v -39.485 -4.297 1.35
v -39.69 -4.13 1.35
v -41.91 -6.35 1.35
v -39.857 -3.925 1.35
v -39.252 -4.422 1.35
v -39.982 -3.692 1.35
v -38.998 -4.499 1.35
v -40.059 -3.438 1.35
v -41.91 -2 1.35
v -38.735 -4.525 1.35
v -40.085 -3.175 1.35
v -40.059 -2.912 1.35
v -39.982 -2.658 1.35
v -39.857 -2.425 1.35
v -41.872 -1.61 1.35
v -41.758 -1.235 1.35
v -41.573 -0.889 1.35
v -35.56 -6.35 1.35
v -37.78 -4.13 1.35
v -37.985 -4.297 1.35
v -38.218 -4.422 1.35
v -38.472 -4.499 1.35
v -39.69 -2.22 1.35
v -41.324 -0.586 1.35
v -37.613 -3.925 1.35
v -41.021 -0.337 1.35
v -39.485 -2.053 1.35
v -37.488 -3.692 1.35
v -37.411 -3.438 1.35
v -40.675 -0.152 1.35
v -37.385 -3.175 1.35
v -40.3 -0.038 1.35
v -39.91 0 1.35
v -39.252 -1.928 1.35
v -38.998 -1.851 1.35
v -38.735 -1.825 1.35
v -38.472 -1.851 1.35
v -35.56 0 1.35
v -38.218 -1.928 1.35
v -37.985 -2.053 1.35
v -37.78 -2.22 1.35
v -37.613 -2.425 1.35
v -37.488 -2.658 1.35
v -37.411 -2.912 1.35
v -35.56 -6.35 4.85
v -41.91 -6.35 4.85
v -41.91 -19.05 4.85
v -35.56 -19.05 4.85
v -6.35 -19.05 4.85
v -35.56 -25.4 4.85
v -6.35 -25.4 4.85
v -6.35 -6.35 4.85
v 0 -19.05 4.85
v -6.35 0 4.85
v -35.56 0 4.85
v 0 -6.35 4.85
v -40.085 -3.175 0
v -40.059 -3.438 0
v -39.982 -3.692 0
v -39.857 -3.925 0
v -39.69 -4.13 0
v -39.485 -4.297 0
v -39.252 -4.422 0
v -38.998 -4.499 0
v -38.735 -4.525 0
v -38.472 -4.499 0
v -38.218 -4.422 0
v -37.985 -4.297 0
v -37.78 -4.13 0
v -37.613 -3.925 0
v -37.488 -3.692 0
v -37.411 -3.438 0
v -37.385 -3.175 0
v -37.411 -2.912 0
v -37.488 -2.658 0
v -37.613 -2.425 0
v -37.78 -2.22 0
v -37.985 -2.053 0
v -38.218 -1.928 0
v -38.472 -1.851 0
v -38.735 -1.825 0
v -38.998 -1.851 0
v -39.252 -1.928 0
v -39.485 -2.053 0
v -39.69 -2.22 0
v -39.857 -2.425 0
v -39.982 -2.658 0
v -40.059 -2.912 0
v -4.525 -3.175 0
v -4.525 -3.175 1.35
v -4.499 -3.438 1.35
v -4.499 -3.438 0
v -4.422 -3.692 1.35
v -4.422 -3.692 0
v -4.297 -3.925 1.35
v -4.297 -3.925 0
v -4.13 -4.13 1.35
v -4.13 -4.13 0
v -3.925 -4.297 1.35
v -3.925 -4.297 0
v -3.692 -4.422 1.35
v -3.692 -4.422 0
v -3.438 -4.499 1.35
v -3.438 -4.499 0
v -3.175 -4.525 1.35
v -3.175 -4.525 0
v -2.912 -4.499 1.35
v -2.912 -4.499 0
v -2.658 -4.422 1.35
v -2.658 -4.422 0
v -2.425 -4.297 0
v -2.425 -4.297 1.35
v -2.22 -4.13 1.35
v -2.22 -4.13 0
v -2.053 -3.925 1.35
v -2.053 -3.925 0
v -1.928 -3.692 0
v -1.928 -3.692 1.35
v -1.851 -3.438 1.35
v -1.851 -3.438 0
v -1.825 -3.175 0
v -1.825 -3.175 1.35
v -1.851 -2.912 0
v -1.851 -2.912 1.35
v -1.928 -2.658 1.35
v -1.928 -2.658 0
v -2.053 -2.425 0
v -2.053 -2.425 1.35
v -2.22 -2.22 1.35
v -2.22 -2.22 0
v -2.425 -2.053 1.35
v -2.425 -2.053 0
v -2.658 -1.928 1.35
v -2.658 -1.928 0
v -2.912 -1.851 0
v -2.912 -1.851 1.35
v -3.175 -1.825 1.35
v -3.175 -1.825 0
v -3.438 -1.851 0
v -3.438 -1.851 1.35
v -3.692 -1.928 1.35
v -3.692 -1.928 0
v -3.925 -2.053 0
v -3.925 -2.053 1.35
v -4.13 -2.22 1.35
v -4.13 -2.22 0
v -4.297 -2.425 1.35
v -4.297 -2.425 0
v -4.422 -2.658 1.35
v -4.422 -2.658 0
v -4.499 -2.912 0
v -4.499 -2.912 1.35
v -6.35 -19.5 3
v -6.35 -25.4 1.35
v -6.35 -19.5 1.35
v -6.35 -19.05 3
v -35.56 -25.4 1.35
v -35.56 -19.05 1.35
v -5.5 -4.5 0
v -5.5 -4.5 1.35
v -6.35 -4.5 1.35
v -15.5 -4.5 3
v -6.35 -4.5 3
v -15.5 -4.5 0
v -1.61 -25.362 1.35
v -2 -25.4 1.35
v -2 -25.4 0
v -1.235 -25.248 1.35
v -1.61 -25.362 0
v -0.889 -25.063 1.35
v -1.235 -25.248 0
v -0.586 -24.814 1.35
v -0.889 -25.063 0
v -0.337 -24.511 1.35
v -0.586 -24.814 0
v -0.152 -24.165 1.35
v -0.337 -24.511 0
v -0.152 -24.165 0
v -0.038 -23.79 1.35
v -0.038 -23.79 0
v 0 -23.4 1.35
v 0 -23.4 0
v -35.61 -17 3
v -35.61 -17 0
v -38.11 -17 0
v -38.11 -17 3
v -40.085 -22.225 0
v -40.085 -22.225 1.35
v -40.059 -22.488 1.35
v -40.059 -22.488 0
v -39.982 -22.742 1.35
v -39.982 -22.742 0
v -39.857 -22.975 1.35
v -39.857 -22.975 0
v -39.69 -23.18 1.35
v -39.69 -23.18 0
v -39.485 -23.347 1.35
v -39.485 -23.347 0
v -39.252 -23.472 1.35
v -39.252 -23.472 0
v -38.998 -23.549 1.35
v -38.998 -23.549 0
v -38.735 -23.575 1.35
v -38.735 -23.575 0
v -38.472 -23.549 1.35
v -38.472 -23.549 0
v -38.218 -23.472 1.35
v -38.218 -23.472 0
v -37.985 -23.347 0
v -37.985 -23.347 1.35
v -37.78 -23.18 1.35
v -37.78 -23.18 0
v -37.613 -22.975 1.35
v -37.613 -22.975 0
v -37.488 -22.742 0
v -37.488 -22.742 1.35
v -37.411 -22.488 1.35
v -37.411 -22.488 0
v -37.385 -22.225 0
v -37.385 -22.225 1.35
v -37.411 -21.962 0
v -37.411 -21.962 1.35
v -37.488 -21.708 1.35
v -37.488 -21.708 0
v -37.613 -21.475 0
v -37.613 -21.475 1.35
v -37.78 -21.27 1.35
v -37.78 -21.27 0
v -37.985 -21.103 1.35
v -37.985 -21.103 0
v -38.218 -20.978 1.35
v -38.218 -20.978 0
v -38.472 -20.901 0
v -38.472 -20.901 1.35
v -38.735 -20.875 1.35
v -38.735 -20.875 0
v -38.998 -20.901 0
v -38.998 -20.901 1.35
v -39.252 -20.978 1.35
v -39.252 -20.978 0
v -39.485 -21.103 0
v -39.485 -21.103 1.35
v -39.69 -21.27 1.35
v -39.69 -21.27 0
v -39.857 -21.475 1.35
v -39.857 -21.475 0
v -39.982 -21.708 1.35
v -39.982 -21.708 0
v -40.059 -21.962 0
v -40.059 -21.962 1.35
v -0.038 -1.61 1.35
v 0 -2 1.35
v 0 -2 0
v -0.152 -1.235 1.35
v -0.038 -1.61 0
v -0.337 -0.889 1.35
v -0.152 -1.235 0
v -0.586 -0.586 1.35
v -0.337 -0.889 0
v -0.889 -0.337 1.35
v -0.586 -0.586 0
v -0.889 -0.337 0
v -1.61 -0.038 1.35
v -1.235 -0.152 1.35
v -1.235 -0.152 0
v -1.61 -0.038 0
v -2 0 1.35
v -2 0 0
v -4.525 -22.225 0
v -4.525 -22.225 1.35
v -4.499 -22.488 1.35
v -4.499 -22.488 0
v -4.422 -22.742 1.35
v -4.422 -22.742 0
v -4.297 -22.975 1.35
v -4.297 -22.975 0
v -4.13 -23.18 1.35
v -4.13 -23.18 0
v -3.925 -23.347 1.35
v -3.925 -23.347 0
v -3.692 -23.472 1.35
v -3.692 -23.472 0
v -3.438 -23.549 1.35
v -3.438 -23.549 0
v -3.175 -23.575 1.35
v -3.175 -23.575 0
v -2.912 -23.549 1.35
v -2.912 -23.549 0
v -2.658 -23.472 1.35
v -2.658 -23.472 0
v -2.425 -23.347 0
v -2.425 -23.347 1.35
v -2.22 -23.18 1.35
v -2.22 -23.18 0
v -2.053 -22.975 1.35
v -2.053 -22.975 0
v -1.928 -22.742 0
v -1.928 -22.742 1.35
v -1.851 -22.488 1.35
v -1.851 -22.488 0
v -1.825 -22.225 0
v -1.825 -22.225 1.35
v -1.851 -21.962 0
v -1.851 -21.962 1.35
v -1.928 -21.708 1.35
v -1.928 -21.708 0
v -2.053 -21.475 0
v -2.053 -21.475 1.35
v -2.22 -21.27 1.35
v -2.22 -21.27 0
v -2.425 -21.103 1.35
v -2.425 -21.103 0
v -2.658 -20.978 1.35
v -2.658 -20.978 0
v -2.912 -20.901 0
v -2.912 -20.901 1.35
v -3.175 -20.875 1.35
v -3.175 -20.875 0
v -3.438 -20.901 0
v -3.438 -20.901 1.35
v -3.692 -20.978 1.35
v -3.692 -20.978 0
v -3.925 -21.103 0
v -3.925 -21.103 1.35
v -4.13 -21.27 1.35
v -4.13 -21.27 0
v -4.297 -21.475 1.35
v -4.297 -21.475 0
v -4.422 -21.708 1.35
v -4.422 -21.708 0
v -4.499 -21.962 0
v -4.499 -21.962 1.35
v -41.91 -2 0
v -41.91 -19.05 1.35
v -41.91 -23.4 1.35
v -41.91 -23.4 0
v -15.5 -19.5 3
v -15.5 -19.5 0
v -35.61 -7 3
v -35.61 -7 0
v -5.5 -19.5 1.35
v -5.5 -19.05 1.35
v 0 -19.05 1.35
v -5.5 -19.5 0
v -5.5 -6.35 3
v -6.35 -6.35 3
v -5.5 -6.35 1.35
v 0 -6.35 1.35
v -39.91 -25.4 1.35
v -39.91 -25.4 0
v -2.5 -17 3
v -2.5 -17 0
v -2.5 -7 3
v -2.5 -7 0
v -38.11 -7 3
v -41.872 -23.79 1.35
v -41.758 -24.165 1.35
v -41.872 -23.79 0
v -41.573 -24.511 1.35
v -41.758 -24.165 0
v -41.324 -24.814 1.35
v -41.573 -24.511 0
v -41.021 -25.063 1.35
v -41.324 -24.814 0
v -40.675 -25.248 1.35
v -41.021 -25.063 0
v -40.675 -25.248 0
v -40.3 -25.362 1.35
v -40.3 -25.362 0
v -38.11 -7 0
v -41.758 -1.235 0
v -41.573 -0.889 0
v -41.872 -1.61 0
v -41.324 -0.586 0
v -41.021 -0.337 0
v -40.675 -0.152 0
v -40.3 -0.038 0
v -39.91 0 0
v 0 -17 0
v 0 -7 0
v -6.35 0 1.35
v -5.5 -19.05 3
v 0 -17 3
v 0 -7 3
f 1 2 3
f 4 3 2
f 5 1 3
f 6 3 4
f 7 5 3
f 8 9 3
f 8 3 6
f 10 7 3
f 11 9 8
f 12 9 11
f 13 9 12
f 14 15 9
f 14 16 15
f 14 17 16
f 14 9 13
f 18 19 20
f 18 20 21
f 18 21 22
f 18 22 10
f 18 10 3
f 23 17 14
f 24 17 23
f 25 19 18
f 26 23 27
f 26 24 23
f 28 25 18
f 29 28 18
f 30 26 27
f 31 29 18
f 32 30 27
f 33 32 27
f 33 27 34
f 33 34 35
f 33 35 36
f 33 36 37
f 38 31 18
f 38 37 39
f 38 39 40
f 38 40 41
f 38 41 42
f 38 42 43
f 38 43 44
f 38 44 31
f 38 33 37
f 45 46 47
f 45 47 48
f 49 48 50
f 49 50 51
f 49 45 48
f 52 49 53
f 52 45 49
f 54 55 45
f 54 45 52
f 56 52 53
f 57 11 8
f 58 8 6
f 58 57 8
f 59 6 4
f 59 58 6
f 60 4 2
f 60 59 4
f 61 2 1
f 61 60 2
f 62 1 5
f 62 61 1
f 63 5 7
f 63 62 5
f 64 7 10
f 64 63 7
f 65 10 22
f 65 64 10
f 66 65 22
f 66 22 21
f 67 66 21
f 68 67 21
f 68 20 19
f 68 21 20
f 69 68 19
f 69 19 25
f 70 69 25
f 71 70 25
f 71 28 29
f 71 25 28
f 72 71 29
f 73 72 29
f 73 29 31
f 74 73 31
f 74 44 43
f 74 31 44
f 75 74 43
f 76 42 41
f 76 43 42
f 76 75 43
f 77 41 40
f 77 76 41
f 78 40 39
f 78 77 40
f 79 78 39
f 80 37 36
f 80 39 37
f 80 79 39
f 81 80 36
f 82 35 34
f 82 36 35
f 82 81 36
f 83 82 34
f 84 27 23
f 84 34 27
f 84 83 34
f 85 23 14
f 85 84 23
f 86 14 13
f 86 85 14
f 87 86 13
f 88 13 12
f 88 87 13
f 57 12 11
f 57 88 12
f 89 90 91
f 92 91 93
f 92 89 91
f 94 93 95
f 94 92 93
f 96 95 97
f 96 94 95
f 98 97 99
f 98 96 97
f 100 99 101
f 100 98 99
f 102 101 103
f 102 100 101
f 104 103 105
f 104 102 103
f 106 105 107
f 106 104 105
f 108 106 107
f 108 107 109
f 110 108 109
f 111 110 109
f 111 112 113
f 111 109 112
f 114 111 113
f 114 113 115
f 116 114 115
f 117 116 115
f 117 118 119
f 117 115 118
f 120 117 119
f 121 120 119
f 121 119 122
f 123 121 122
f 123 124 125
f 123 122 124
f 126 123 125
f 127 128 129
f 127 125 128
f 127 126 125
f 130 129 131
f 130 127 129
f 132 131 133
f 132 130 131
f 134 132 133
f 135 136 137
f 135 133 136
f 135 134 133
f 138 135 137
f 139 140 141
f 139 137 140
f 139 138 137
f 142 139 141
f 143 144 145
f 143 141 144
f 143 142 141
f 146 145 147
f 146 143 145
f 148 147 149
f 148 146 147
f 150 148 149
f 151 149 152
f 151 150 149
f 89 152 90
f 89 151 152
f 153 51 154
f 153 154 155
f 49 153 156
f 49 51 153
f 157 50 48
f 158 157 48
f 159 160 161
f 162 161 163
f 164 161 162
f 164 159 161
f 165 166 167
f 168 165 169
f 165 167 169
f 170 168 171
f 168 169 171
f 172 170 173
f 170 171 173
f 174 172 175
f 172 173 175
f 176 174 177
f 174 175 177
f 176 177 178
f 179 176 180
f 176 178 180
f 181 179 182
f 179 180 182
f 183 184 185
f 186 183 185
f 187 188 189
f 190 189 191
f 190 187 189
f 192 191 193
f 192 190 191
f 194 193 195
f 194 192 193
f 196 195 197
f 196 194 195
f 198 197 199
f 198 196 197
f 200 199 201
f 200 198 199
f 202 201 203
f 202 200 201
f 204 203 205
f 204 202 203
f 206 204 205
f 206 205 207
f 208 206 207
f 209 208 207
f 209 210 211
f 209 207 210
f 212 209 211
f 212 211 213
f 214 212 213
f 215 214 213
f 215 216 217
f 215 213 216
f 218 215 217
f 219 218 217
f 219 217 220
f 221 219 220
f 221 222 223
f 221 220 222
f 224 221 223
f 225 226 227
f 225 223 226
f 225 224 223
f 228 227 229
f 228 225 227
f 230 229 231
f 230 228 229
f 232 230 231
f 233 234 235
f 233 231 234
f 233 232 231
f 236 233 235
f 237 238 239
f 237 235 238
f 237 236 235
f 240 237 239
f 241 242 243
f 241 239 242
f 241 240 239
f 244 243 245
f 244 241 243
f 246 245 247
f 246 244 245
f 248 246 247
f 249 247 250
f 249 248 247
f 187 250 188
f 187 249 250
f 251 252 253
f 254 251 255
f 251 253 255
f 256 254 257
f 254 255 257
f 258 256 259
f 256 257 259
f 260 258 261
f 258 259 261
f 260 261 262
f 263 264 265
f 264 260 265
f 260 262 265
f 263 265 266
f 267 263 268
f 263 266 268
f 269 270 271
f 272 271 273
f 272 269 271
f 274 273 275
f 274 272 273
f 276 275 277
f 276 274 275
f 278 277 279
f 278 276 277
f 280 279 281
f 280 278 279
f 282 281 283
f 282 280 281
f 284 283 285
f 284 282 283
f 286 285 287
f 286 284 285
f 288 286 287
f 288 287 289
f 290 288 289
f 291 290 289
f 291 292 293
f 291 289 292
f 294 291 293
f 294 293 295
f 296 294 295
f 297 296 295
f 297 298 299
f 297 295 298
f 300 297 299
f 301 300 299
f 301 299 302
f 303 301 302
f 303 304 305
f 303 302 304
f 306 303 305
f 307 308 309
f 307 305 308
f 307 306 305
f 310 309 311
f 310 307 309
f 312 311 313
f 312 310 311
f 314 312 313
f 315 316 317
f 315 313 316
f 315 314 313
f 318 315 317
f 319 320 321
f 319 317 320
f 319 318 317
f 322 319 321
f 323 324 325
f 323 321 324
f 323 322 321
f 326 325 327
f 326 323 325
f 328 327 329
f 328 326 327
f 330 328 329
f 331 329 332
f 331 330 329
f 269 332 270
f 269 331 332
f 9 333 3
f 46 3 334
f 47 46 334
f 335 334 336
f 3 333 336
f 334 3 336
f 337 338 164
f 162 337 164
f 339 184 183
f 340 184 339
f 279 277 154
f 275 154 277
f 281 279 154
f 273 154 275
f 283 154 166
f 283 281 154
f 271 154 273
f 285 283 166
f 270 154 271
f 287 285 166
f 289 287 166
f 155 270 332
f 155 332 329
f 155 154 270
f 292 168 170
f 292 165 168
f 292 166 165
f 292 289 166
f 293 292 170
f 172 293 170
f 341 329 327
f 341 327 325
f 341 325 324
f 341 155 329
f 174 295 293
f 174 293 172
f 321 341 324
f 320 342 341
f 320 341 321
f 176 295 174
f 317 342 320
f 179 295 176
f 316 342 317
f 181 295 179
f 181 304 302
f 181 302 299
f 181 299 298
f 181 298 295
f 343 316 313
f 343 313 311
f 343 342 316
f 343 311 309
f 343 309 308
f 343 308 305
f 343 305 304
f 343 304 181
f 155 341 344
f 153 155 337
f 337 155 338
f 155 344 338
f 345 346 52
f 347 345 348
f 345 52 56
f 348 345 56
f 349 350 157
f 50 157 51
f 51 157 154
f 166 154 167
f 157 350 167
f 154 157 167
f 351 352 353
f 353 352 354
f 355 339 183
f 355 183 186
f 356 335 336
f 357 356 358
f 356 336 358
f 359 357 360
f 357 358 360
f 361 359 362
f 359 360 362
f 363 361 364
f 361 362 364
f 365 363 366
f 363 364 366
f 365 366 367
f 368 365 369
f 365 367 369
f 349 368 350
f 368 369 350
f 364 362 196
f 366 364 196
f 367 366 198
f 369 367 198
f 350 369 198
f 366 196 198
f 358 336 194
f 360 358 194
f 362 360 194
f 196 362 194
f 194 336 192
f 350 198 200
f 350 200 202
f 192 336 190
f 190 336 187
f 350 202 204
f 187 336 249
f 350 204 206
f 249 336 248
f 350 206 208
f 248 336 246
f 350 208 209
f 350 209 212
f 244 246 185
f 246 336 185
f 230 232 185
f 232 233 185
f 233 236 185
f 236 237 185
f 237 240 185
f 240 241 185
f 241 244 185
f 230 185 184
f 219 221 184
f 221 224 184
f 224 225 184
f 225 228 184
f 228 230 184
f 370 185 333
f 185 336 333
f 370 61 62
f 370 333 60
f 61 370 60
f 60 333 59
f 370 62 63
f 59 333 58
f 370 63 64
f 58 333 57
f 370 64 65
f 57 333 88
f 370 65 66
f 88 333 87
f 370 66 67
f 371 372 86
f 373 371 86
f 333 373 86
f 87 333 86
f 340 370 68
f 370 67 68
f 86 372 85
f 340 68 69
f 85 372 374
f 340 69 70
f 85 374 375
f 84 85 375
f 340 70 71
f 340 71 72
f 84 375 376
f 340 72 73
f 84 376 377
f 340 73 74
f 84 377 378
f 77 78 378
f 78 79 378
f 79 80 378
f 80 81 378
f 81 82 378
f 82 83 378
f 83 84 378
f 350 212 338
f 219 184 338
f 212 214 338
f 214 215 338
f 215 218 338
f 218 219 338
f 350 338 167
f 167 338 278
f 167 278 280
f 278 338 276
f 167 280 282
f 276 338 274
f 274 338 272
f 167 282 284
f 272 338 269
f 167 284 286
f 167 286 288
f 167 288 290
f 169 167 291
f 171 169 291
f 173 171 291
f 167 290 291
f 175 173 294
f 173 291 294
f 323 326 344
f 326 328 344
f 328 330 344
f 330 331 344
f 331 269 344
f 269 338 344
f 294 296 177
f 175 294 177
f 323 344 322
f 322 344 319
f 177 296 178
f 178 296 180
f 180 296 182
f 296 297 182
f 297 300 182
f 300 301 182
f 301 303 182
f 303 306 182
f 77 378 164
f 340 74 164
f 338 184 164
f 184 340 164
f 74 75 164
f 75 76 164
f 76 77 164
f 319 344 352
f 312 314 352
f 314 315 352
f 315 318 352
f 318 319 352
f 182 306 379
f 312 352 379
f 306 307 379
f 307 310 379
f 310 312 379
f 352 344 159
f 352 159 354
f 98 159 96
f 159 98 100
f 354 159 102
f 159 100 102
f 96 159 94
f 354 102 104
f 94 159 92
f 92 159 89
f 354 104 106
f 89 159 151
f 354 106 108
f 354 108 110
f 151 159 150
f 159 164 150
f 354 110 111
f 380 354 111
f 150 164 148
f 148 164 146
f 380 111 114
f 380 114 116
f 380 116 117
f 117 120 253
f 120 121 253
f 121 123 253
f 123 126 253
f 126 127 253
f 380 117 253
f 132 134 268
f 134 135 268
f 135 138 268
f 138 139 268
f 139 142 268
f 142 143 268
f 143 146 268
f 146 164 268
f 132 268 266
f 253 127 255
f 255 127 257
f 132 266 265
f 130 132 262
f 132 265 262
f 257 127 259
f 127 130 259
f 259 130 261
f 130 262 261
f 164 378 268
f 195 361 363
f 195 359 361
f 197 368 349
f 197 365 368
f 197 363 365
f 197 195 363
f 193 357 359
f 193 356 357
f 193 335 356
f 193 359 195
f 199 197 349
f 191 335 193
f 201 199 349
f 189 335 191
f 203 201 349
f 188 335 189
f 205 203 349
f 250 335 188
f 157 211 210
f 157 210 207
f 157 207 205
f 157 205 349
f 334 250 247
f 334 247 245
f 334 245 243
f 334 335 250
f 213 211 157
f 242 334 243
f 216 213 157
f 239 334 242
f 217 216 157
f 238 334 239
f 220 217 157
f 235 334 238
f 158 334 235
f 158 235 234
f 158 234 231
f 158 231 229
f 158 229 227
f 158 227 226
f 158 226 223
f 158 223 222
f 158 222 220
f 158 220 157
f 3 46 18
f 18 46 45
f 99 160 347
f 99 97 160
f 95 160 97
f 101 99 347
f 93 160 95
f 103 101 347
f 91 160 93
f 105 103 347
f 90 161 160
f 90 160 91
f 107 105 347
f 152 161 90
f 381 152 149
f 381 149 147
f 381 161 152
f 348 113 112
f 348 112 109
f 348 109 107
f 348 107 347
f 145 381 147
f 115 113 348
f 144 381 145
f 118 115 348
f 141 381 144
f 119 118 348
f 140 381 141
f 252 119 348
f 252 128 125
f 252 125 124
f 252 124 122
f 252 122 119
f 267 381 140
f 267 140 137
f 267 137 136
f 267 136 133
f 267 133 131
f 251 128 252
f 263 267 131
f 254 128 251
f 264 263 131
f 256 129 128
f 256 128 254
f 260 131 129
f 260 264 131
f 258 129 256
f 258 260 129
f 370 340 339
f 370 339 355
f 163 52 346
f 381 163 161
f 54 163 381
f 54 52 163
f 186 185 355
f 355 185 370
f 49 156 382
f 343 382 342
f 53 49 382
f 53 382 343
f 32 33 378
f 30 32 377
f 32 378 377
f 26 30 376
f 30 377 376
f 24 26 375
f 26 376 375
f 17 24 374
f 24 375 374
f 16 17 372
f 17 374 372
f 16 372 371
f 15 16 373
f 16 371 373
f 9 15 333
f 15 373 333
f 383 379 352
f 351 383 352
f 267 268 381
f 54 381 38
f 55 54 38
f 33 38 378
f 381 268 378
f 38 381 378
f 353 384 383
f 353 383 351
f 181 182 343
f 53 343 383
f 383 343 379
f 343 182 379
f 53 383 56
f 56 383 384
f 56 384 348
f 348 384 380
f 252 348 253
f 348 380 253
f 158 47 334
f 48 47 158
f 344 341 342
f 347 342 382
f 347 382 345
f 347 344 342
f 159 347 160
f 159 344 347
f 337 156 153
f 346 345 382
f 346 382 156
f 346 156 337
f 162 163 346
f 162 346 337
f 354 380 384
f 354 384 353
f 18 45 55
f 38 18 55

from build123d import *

# Parameters (mm, degrees)
SKETCH1_R           = 1.35
BOSS_EXTRUDE1_DEPTH = 4.85
SKETCH2_W           = 2.5
SKETCH2_H           = 10
SKETCH2_W_2         = 10
SKETCH2_H_2         = 15
CUT_EXTRUDE1_DEPTH  = 3
SKETCH4_W           = 6.35
SKETCH4_H           = 6.35
CUT_EXTRUDE3_DEPTH  = 3.5


with BuildPart() as part:
    # Sketch1 → Boss-Extrude1 (new body)
    with BuildSketch(Plane.XY):
        with BuildLine():
            Line((-2, 0), (-39.91, 0))
            ThreePointArc((-39.91, 0), (-41.324213562, -0.585786438), (-41.91, -2))
            Line((-41.91, -2), (-41.91, -23.4))
            ThreePointArc((-41.91, -23.4), (-41.324213562, -24.814213562), (-39.91, -25.4))
            Line((-39.91, -25.4), (-2, -25.4))
            ThreePointArc((-2, -25.4), (-0.585786438, -24.814213562), (0, -23.4))
            Line((0, -23.4), (0, -2))
            ThreePointArc((0, -2), (-0.585786438, -0.585786438), (-2, 0))
        make_face()
        with Locations(Location((-38.735, -22.225, 0), (0, 0, 180))):
            Circle(SKETCH1_R, mode=Mode.SUBTRACT)
        with Locations(Location((-38.735, -3.175, 0), (0, 0, 180))):
            Circle(SKETCH1_R, mode=Mode.SUBTRACT)
        with Locations(Location((-3.175, -3.175, 0), (0, 0, 180))):
            Circle(SKETCH1_R, mode=Mode.SUBTRACT)
        with Locations(Location((-3.175, -22.225, 0), (0, 0, 180))):
            Circle(SKETCH1_R, mode=Mode.SUBTRACT)
    extrude(amount=BOSS_EXTRUDE1_DEPTH)

    # Sketch2 → Cut-Extrude1 (cut)
    with BuildSketch(Plane(origin=(0, 0, 0), x_dir=(-1, 0, 0), z_dir=(0, 0, -1))):
        with Locations((1.25, -12)):
            Rectangle(SKETCH2_W, SKETCH2_H)
        with Locations((10.5, -12)):
            Rectangle(SKETCH2_W_2, SKETCH2_H_2)
        with Locations((36.86, -12)):
            Rectangle(SKETCH2_W, SKETCH2_H)
    extrude(amount=-CUT_EXTRUDE1_DEPTH, mode=Mode.SUBTRACT)

    # Sketch4 → Cut-Extrude3 (cut)
    with BuildSketch(Plane.XY.offset(4.85)):
        with Locations((-38.735, -3.175)):
            Rectangle(SKETCH4_W, SKETCH4_H)
        with Locations((-38.735, -22.225)):
            Rectangle(SKETCH4_W, SKETCH4_H)
        with Locations((-3.175, -22.225)):
            Rectangle(SKETCH4_W, SKETCH4_H)
        with Locations((-3.175, -3.175)):
            Rectangle(SKETCH4_W, SKETCH4_H)
    extrude(amount=-CUT_EXTRUDE3_DEPTH, mode=Mode.SUBTRACT)


solid = part.part
